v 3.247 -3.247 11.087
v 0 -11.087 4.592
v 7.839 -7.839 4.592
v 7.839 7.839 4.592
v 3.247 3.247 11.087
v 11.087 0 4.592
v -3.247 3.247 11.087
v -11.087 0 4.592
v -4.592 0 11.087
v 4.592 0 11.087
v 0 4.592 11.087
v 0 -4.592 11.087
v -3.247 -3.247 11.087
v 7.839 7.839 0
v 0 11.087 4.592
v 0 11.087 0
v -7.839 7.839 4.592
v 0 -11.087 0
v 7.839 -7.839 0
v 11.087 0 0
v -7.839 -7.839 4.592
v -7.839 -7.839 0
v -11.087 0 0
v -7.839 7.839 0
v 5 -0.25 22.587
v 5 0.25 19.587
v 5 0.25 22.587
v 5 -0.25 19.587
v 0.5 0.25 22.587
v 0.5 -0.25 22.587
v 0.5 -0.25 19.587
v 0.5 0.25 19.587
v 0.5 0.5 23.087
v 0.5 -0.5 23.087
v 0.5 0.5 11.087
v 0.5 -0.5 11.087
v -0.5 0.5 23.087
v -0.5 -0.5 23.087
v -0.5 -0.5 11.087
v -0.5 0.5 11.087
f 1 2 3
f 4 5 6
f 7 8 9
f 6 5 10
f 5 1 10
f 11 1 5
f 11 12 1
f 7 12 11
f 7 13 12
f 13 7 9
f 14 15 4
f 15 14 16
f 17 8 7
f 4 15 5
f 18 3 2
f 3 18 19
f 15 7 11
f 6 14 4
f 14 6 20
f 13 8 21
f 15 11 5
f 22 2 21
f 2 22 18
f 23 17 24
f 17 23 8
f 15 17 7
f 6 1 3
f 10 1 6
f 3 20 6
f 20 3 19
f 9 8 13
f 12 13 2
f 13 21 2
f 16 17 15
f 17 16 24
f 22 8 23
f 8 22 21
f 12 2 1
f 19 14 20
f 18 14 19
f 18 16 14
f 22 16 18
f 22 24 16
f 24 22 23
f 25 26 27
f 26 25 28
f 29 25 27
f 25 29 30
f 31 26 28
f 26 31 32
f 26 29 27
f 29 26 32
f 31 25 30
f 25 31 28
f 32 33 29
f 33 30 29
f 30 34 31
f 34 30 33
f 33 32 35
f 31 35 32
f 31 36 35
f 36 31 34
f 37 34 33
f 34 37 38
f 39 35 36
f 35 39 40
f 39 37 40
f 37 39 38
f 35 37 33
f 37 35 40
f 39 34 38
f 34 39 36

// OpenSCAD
// Group at the top level.
group(name="octo_dome") color("blue") {
    difference() {
      sphere(r=12, $fn=8);
      translate([-500, -500, -1000]) cube(1000);
    }
  }

// Group with one module applied to it.
color("red") group(name="flag")
    translate([0, 0, 12 * cos(360 / 16)]) {
      translate([0, -0.25, 8.5]) cube([5, 0.5, 3]);
      translate([-0.5, -0.50, 0]) cube([1, 1, 12]);
    }

// Empty
group(){}
